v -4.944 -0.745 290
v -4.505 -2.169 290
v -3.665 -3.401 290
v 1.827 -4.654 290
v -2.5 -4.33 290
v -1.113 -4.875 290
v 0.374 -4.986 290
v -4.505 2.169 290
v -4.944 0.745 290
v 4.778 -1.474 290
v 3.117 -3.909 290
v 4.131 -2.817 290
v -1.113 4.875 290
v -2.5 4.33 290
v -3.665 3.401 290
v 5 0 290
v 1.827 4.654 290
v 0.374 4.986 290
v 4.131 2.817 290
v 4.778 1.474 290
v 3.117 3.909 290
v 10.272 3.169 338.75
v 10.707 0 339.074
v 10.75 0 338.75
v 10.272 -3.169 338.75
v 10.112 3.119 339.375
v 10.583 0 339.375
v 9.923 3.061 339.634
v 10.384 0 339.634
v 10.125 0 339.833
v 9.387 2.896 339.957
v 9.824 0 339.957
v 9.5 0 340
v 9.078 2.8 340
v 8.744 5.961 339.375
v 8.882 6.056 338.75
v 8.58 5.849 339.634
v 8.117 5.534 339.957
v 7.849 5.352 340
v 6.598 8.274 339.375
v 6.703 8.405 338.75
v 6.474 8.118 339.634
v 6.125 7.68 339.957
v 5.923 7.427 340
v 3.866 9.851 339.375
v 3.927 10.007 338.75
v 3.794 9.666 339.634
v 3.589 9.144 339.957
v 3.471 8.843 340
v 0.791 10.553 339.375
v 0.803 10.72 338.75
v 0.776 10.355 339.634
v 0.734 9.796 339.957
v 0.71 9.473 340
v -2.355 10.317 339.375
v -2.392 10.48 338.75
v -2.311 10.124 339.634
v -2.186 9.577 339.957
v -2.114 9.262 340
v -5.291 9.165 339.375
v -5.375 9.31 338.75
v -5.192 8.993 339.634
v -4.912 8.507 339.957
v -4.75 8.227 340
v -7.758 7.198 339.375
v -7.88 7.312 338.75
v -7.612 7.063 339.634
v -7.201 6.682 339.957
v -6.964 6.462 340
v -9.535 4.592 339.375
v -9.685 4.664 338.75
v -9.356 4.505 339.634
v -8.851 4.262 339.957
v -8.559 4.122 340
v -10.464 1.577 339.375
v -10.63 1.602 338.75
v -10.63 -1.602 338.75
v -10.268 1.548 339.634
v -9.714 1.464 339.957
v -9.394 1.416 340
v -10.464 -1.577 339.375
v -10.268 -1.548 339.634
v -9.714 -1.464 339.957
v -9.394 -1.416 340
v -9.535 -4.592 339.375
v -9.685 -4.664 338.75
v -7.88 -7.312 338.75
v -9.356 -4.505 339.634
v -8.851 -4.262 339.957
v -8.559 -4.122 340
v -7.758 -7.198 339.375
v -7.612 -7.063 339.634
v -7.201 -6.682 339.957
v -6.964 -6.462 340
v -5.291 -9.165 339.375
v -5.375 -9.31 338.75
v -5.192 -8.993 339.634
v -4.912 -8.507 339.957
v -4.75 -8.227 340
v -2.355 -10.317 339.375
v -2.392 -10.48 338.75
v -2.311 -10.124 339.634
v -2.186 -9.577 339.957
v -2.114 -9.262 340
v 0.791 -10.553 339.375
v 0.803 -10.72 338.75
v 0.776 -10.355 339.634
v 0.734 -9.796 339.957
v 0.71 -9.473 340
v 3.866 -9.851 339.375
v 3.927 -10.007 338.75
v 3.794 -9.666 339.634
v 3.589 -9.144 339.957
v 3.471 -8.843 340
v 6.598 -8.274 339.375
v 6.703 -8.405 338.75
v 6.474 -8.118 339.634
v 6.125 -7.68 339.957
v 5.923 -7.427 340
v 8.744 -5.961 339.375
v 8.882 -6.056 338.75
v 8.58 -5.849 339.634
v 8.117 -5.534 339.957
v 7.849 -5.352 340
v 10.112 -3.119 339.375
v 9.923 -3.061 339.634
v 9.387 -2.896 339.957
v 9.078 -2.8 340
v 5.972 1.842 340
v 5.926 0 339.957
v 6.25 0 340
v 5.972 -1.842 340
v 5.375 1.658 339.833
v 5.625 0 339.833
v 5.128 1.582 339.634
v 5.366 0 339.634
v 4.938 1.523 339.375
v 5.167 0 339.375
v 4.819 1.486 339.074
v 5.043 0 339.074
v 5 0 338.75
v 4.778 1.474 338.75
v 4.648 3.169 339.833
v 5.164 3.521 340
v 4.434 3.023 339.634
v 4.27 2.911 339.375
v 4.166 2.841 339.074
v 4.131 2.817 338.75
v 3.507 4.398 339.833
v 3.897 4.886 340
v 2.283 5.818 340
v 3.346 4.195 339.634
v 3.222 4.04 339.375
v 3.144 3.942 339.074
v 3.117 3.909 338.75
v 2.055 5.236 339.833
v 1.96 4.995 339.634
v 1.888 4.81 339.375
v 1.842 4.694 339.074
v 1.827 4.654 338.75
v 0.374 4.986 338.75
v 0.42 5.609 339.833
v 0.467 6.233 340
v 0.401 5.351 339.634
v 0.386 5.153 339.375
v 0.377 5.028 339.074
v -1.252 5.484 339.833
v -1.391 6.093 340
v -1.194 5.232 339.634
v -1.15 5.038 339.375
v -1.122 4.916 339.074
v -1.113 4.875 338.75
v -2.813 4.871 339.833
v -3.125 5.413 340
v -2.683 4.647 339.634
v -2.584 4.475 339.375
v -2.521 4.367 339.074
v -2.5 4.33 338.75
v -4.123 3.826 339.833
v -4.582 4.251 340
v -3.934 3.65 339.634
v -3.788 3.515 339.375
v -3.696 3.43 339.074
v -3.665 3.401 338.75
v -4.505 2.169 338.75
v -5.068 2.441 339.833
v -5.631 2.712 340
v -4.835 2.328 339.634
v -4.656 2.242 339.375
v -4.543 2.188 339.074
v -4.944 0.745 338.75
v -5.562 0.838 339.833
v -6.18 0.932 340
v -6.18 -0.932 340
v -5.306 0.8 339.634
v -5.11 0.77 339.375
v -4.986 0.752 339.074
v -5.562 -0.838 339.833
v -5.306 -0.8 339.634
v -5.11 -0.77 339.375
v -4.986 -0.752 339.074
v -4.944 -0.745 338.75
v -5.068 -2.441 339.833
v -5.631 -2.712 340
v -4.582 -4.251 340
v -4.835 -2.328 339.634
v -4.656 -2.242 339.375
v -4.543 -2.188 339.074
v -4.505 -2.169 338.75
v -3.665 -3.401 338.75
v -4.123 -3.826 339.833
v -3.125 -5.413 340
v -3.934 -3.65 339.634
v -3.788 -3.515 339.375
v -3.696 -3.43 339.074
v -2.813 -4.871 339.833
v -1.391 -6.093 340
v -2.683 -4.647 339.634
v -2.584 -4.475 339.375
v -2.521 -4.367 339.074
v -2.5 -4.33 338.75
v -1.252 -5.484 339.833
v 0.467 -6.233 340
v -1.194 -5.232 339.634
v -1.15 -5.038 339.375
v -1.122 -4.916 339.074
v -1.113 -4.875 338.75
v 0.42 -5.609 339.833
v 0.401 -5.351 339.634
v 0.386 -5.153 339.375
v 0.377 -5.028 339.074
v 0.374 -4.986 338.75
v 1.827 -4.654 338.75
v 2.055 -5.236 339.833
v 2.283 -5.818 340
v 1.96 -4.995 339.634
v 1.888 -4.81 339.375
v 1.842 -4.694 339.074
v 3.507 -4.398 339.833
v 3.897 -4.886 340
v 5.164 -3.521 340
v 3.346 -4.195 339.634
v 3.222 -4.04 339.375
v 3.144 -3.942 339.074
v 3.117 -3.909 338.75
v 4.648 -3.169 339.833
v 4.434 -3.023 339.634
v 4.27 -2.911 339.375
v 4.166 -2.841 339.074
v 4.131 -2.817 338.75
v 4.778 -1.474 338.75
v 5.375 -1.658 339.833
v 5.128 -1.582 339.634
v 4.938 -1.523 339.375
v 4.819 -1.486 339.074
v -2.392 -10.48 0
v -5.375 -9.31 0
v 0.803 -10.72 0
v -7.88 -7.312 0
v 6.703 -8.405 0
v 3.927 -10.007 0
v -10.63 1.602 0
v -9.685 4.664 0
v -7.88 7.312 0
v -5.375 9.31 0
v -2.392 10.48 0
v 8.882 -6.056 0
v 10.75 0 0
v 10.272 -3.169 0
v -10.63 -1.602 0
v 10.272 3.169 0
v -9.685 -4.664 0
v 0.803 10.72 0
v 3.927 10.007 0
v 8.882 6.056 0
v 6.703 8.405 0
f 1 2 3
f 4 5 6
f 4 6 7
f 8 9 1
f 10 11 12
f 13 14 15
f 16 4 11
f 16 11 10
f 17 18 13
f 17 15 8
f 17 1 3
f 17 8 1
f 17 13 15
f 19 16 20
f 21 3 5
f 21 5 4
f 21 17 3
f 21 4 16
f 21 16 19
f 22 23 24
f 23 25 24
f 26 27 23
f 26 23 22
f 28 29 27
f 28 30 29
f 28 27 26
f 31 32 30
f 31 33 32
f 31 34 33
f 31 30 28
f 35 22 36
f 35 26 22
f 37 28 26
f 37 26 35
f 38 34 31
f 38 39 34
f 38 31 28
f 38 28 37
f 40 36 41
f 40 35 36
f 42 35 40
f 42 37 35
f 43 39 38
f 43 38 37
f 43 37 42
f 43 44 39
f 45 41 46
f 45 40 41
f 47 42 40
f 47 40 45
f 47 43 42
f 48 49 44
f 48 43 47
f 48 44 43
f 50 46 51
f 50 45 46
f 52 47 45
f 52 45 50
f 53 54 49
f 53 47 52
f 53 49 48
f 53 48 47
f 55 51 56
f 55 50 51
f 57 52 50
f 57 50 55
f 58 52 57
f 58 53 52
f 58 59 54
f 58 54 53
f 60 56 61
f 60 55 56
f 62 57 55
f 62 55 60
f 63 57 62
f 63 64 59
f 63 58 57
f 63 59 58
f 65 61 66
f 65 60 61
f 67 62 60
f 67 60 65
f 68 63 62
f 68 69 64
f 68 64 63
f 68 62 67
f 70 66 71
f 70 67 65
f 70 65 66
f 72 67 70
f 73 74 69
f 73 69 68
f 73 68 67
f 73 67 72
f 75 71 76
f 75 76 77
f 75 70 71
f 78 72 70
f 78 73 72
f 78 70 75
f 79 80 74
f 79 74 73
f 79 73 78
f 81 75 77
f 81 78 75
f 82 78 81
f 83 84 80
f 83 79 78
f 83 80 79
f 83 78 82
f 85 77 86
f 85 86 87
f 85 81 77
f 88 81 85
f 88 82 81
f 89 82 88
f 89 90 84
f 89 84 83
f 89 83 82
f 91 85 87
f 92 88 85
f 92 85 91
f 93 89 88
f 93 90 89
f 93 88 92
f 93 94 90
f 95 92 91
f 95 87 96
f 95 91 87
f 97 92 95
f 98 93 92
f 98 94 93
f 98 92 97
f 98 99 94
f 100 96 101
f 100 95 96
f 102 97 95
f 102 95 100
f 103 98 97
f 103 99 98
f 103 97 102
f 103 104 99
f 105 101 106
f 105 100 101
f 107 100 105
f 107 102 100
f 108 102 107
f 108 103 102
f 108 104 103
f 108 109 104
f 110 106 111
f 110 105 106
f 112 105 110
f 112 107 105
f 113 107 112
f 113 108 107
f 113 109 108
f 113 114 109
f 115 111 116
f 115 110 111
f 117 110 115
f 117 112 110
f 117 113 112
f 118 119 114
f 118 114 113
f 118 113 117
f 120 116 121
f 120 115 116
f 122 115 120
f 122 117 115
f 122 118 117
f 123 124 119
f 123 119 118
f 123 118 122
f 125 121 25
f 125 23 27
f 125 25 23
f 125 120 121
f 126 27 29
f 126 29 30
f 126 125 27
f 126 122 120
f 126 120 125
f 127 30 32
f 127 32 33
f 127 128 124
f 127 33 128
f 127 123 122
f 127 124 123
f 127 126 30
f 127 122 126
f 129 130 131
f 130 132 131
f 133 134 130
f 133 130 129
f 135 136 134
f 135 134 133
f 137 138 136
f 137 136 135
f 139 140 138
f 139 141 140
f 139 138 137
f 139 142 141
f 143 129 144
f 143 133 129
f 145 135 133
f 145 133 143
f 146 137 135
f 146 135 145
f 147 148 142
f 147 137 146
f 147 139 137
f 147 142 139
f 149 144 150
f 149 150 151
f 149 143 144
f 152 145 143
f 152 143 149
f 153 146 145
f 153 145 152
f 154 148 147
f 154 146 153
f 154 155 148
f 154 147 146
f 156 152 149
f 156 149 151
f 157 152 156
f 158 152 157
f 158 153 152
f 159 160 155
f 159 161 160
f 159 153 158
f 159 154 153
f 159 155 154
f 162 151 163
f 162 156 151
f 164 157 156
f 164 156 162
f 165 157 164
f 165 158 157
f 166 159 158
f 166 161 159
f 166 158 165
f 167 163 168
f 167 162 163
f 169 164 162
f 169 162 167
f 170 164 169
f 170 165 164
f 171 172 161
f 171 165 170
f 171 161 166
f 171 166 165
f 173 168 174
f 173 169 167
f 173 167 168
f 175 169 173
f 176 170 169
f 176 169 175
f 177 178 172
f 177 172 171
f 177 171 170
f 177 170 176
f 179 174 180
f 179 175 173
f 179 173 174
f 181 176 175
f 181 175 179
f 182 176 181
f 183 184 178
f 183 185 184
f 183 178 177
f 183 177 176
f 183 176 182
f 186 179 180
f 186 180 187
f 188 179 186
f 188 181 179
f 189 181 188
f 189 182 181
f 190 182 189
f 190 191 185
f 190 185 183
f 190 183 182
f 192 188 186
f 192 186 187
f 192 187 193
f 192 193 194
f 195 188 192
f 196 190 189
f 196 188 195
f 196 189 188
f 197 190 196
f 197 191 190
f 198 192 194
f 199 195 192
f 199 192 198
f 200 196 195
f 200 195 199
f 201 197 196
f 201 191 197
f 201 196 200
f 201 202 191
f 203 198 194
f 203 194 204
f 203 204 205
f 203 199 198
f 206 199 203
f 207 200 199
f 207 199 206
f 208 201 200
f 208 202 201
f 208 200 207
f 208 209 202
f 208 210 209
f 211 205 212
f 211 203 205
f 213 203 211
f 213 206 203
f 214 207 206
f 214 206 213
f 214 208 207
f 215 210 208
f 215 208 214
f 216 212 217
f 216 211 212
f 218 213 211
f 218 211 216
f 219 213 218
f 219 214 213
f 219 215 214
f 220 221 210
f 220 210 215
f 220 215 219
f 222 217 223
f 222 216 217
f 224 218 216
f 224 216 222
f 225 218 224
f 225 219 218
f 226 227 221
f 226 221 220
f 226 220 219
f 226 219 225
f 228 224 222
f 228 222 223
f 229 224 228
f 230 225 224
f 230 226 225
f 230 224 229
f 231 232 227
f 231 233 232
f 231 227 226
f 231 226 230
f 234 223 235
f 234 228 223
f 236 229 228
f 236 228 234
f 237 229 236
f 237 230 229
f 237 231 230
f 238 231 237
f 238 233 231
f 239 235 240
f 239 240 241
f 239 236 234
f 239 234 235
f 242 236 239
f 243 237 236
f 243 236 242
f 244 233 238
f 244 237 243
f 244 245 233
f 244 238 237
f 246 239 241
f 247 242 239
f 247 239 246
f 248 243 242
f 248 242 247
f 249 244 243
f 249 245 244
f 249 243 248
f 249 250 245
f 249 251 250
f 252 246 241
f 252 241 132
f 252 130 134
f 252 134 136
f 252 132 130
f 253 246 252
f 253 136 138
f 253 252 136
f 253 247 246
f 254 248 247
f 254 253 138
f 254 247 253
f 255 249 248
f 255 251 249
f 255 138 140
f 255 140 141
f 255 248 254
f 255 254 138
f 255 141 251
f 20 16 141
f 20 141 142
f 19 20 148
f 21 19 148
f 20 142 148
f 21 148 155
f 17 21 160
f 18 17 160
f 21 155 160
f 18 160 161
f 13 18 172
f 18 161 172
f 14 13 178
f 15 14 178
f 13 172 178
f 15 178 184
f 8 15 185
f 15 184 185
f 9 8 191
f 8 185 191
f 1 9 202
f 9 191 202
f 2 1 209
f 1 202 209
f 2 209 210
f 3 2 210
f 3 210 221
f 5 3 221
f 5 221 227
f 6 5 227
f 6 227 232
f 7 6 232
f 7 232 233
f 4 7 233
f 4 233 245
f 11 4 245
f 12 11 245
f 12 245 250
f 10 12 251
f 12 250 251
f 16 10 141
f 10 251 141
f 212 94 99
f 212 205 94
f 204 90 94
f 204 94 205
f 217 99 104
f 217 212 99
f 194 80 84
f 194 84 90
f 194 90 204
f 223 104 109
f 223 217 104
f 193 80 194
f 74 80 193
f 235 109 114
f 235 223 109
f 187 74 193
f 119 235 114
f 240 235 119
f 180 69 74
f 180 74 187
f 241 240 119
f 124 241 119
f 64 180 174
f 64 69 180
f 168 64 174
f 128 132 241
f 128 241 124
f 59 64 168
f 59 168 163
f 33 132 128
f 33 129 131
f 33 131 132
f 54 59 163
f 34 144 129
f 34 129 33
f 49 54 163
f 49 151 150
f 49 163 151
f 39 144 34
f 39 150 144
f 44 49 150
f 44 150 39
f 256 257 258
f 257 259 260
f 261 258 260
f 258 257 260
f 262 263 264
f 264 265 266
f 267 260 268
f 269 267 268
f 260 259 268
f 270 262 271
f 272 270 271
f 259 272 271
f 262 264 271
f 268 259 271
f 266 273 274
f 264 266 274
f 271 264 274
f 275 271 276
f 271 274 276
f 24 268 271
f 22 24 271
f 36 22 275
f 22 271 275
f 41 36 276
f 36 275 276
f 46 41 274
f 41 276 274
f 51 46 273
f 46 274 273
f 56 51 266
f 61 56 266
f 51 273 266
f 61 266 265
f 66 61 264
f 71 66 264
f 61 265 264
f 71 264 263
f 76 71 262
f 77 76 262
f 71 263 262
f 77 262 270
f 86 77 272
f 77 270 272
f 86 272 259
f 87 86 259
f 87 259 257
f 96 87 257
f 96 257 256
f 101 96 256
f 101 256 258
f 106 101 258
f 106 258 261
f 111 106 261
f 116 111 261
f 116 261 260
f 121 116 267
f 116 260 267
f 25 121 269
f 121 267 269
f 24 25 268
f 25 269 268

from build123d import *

# Parameters (mm, degrees)
SKETCH1_R           = 2.15
BOSS_EXTRUDE1_DEPTH = 68
SKETCH2_R           = 1
CUT_EXTRUDE1_DEPTH  = 10
FILLET1_R           = 0.25
SCALE1_SCALE        = 5


with BuildPart() as part:
    # Sketch1 → Boss-Extrude1 (new body)
    with BuildSketch(Plane.XY):
        Circle(SKETCH1_R)
    extrude(amount=BOSS_EXTRUDE1_DEPTH)

    # Sketch2 → Cut-Extrude1 (cut)
    with BuildSketch(Plane.XY.offset(68)):
        Circle(SKETCH2_R)
    extrude(amount=-CUT_EXTRUDE1_DEPTH, mode=Mode.SUBTRACT)

    # Fillet1
    fillet1_edges = [part.edges().sort_by_distance(p)[0] for p in [
        (-2.15, 0, 68),
        (-1, 0, 68),
    ]]
    fillet(fillet1_edges, radius=FILLET1_R)


with BuildPart() as part_1:
    # Scale1: scaled about (0, 0, 0)
    add(part.part.scale(SCALE1_SCALE))


solid = part_1.part
